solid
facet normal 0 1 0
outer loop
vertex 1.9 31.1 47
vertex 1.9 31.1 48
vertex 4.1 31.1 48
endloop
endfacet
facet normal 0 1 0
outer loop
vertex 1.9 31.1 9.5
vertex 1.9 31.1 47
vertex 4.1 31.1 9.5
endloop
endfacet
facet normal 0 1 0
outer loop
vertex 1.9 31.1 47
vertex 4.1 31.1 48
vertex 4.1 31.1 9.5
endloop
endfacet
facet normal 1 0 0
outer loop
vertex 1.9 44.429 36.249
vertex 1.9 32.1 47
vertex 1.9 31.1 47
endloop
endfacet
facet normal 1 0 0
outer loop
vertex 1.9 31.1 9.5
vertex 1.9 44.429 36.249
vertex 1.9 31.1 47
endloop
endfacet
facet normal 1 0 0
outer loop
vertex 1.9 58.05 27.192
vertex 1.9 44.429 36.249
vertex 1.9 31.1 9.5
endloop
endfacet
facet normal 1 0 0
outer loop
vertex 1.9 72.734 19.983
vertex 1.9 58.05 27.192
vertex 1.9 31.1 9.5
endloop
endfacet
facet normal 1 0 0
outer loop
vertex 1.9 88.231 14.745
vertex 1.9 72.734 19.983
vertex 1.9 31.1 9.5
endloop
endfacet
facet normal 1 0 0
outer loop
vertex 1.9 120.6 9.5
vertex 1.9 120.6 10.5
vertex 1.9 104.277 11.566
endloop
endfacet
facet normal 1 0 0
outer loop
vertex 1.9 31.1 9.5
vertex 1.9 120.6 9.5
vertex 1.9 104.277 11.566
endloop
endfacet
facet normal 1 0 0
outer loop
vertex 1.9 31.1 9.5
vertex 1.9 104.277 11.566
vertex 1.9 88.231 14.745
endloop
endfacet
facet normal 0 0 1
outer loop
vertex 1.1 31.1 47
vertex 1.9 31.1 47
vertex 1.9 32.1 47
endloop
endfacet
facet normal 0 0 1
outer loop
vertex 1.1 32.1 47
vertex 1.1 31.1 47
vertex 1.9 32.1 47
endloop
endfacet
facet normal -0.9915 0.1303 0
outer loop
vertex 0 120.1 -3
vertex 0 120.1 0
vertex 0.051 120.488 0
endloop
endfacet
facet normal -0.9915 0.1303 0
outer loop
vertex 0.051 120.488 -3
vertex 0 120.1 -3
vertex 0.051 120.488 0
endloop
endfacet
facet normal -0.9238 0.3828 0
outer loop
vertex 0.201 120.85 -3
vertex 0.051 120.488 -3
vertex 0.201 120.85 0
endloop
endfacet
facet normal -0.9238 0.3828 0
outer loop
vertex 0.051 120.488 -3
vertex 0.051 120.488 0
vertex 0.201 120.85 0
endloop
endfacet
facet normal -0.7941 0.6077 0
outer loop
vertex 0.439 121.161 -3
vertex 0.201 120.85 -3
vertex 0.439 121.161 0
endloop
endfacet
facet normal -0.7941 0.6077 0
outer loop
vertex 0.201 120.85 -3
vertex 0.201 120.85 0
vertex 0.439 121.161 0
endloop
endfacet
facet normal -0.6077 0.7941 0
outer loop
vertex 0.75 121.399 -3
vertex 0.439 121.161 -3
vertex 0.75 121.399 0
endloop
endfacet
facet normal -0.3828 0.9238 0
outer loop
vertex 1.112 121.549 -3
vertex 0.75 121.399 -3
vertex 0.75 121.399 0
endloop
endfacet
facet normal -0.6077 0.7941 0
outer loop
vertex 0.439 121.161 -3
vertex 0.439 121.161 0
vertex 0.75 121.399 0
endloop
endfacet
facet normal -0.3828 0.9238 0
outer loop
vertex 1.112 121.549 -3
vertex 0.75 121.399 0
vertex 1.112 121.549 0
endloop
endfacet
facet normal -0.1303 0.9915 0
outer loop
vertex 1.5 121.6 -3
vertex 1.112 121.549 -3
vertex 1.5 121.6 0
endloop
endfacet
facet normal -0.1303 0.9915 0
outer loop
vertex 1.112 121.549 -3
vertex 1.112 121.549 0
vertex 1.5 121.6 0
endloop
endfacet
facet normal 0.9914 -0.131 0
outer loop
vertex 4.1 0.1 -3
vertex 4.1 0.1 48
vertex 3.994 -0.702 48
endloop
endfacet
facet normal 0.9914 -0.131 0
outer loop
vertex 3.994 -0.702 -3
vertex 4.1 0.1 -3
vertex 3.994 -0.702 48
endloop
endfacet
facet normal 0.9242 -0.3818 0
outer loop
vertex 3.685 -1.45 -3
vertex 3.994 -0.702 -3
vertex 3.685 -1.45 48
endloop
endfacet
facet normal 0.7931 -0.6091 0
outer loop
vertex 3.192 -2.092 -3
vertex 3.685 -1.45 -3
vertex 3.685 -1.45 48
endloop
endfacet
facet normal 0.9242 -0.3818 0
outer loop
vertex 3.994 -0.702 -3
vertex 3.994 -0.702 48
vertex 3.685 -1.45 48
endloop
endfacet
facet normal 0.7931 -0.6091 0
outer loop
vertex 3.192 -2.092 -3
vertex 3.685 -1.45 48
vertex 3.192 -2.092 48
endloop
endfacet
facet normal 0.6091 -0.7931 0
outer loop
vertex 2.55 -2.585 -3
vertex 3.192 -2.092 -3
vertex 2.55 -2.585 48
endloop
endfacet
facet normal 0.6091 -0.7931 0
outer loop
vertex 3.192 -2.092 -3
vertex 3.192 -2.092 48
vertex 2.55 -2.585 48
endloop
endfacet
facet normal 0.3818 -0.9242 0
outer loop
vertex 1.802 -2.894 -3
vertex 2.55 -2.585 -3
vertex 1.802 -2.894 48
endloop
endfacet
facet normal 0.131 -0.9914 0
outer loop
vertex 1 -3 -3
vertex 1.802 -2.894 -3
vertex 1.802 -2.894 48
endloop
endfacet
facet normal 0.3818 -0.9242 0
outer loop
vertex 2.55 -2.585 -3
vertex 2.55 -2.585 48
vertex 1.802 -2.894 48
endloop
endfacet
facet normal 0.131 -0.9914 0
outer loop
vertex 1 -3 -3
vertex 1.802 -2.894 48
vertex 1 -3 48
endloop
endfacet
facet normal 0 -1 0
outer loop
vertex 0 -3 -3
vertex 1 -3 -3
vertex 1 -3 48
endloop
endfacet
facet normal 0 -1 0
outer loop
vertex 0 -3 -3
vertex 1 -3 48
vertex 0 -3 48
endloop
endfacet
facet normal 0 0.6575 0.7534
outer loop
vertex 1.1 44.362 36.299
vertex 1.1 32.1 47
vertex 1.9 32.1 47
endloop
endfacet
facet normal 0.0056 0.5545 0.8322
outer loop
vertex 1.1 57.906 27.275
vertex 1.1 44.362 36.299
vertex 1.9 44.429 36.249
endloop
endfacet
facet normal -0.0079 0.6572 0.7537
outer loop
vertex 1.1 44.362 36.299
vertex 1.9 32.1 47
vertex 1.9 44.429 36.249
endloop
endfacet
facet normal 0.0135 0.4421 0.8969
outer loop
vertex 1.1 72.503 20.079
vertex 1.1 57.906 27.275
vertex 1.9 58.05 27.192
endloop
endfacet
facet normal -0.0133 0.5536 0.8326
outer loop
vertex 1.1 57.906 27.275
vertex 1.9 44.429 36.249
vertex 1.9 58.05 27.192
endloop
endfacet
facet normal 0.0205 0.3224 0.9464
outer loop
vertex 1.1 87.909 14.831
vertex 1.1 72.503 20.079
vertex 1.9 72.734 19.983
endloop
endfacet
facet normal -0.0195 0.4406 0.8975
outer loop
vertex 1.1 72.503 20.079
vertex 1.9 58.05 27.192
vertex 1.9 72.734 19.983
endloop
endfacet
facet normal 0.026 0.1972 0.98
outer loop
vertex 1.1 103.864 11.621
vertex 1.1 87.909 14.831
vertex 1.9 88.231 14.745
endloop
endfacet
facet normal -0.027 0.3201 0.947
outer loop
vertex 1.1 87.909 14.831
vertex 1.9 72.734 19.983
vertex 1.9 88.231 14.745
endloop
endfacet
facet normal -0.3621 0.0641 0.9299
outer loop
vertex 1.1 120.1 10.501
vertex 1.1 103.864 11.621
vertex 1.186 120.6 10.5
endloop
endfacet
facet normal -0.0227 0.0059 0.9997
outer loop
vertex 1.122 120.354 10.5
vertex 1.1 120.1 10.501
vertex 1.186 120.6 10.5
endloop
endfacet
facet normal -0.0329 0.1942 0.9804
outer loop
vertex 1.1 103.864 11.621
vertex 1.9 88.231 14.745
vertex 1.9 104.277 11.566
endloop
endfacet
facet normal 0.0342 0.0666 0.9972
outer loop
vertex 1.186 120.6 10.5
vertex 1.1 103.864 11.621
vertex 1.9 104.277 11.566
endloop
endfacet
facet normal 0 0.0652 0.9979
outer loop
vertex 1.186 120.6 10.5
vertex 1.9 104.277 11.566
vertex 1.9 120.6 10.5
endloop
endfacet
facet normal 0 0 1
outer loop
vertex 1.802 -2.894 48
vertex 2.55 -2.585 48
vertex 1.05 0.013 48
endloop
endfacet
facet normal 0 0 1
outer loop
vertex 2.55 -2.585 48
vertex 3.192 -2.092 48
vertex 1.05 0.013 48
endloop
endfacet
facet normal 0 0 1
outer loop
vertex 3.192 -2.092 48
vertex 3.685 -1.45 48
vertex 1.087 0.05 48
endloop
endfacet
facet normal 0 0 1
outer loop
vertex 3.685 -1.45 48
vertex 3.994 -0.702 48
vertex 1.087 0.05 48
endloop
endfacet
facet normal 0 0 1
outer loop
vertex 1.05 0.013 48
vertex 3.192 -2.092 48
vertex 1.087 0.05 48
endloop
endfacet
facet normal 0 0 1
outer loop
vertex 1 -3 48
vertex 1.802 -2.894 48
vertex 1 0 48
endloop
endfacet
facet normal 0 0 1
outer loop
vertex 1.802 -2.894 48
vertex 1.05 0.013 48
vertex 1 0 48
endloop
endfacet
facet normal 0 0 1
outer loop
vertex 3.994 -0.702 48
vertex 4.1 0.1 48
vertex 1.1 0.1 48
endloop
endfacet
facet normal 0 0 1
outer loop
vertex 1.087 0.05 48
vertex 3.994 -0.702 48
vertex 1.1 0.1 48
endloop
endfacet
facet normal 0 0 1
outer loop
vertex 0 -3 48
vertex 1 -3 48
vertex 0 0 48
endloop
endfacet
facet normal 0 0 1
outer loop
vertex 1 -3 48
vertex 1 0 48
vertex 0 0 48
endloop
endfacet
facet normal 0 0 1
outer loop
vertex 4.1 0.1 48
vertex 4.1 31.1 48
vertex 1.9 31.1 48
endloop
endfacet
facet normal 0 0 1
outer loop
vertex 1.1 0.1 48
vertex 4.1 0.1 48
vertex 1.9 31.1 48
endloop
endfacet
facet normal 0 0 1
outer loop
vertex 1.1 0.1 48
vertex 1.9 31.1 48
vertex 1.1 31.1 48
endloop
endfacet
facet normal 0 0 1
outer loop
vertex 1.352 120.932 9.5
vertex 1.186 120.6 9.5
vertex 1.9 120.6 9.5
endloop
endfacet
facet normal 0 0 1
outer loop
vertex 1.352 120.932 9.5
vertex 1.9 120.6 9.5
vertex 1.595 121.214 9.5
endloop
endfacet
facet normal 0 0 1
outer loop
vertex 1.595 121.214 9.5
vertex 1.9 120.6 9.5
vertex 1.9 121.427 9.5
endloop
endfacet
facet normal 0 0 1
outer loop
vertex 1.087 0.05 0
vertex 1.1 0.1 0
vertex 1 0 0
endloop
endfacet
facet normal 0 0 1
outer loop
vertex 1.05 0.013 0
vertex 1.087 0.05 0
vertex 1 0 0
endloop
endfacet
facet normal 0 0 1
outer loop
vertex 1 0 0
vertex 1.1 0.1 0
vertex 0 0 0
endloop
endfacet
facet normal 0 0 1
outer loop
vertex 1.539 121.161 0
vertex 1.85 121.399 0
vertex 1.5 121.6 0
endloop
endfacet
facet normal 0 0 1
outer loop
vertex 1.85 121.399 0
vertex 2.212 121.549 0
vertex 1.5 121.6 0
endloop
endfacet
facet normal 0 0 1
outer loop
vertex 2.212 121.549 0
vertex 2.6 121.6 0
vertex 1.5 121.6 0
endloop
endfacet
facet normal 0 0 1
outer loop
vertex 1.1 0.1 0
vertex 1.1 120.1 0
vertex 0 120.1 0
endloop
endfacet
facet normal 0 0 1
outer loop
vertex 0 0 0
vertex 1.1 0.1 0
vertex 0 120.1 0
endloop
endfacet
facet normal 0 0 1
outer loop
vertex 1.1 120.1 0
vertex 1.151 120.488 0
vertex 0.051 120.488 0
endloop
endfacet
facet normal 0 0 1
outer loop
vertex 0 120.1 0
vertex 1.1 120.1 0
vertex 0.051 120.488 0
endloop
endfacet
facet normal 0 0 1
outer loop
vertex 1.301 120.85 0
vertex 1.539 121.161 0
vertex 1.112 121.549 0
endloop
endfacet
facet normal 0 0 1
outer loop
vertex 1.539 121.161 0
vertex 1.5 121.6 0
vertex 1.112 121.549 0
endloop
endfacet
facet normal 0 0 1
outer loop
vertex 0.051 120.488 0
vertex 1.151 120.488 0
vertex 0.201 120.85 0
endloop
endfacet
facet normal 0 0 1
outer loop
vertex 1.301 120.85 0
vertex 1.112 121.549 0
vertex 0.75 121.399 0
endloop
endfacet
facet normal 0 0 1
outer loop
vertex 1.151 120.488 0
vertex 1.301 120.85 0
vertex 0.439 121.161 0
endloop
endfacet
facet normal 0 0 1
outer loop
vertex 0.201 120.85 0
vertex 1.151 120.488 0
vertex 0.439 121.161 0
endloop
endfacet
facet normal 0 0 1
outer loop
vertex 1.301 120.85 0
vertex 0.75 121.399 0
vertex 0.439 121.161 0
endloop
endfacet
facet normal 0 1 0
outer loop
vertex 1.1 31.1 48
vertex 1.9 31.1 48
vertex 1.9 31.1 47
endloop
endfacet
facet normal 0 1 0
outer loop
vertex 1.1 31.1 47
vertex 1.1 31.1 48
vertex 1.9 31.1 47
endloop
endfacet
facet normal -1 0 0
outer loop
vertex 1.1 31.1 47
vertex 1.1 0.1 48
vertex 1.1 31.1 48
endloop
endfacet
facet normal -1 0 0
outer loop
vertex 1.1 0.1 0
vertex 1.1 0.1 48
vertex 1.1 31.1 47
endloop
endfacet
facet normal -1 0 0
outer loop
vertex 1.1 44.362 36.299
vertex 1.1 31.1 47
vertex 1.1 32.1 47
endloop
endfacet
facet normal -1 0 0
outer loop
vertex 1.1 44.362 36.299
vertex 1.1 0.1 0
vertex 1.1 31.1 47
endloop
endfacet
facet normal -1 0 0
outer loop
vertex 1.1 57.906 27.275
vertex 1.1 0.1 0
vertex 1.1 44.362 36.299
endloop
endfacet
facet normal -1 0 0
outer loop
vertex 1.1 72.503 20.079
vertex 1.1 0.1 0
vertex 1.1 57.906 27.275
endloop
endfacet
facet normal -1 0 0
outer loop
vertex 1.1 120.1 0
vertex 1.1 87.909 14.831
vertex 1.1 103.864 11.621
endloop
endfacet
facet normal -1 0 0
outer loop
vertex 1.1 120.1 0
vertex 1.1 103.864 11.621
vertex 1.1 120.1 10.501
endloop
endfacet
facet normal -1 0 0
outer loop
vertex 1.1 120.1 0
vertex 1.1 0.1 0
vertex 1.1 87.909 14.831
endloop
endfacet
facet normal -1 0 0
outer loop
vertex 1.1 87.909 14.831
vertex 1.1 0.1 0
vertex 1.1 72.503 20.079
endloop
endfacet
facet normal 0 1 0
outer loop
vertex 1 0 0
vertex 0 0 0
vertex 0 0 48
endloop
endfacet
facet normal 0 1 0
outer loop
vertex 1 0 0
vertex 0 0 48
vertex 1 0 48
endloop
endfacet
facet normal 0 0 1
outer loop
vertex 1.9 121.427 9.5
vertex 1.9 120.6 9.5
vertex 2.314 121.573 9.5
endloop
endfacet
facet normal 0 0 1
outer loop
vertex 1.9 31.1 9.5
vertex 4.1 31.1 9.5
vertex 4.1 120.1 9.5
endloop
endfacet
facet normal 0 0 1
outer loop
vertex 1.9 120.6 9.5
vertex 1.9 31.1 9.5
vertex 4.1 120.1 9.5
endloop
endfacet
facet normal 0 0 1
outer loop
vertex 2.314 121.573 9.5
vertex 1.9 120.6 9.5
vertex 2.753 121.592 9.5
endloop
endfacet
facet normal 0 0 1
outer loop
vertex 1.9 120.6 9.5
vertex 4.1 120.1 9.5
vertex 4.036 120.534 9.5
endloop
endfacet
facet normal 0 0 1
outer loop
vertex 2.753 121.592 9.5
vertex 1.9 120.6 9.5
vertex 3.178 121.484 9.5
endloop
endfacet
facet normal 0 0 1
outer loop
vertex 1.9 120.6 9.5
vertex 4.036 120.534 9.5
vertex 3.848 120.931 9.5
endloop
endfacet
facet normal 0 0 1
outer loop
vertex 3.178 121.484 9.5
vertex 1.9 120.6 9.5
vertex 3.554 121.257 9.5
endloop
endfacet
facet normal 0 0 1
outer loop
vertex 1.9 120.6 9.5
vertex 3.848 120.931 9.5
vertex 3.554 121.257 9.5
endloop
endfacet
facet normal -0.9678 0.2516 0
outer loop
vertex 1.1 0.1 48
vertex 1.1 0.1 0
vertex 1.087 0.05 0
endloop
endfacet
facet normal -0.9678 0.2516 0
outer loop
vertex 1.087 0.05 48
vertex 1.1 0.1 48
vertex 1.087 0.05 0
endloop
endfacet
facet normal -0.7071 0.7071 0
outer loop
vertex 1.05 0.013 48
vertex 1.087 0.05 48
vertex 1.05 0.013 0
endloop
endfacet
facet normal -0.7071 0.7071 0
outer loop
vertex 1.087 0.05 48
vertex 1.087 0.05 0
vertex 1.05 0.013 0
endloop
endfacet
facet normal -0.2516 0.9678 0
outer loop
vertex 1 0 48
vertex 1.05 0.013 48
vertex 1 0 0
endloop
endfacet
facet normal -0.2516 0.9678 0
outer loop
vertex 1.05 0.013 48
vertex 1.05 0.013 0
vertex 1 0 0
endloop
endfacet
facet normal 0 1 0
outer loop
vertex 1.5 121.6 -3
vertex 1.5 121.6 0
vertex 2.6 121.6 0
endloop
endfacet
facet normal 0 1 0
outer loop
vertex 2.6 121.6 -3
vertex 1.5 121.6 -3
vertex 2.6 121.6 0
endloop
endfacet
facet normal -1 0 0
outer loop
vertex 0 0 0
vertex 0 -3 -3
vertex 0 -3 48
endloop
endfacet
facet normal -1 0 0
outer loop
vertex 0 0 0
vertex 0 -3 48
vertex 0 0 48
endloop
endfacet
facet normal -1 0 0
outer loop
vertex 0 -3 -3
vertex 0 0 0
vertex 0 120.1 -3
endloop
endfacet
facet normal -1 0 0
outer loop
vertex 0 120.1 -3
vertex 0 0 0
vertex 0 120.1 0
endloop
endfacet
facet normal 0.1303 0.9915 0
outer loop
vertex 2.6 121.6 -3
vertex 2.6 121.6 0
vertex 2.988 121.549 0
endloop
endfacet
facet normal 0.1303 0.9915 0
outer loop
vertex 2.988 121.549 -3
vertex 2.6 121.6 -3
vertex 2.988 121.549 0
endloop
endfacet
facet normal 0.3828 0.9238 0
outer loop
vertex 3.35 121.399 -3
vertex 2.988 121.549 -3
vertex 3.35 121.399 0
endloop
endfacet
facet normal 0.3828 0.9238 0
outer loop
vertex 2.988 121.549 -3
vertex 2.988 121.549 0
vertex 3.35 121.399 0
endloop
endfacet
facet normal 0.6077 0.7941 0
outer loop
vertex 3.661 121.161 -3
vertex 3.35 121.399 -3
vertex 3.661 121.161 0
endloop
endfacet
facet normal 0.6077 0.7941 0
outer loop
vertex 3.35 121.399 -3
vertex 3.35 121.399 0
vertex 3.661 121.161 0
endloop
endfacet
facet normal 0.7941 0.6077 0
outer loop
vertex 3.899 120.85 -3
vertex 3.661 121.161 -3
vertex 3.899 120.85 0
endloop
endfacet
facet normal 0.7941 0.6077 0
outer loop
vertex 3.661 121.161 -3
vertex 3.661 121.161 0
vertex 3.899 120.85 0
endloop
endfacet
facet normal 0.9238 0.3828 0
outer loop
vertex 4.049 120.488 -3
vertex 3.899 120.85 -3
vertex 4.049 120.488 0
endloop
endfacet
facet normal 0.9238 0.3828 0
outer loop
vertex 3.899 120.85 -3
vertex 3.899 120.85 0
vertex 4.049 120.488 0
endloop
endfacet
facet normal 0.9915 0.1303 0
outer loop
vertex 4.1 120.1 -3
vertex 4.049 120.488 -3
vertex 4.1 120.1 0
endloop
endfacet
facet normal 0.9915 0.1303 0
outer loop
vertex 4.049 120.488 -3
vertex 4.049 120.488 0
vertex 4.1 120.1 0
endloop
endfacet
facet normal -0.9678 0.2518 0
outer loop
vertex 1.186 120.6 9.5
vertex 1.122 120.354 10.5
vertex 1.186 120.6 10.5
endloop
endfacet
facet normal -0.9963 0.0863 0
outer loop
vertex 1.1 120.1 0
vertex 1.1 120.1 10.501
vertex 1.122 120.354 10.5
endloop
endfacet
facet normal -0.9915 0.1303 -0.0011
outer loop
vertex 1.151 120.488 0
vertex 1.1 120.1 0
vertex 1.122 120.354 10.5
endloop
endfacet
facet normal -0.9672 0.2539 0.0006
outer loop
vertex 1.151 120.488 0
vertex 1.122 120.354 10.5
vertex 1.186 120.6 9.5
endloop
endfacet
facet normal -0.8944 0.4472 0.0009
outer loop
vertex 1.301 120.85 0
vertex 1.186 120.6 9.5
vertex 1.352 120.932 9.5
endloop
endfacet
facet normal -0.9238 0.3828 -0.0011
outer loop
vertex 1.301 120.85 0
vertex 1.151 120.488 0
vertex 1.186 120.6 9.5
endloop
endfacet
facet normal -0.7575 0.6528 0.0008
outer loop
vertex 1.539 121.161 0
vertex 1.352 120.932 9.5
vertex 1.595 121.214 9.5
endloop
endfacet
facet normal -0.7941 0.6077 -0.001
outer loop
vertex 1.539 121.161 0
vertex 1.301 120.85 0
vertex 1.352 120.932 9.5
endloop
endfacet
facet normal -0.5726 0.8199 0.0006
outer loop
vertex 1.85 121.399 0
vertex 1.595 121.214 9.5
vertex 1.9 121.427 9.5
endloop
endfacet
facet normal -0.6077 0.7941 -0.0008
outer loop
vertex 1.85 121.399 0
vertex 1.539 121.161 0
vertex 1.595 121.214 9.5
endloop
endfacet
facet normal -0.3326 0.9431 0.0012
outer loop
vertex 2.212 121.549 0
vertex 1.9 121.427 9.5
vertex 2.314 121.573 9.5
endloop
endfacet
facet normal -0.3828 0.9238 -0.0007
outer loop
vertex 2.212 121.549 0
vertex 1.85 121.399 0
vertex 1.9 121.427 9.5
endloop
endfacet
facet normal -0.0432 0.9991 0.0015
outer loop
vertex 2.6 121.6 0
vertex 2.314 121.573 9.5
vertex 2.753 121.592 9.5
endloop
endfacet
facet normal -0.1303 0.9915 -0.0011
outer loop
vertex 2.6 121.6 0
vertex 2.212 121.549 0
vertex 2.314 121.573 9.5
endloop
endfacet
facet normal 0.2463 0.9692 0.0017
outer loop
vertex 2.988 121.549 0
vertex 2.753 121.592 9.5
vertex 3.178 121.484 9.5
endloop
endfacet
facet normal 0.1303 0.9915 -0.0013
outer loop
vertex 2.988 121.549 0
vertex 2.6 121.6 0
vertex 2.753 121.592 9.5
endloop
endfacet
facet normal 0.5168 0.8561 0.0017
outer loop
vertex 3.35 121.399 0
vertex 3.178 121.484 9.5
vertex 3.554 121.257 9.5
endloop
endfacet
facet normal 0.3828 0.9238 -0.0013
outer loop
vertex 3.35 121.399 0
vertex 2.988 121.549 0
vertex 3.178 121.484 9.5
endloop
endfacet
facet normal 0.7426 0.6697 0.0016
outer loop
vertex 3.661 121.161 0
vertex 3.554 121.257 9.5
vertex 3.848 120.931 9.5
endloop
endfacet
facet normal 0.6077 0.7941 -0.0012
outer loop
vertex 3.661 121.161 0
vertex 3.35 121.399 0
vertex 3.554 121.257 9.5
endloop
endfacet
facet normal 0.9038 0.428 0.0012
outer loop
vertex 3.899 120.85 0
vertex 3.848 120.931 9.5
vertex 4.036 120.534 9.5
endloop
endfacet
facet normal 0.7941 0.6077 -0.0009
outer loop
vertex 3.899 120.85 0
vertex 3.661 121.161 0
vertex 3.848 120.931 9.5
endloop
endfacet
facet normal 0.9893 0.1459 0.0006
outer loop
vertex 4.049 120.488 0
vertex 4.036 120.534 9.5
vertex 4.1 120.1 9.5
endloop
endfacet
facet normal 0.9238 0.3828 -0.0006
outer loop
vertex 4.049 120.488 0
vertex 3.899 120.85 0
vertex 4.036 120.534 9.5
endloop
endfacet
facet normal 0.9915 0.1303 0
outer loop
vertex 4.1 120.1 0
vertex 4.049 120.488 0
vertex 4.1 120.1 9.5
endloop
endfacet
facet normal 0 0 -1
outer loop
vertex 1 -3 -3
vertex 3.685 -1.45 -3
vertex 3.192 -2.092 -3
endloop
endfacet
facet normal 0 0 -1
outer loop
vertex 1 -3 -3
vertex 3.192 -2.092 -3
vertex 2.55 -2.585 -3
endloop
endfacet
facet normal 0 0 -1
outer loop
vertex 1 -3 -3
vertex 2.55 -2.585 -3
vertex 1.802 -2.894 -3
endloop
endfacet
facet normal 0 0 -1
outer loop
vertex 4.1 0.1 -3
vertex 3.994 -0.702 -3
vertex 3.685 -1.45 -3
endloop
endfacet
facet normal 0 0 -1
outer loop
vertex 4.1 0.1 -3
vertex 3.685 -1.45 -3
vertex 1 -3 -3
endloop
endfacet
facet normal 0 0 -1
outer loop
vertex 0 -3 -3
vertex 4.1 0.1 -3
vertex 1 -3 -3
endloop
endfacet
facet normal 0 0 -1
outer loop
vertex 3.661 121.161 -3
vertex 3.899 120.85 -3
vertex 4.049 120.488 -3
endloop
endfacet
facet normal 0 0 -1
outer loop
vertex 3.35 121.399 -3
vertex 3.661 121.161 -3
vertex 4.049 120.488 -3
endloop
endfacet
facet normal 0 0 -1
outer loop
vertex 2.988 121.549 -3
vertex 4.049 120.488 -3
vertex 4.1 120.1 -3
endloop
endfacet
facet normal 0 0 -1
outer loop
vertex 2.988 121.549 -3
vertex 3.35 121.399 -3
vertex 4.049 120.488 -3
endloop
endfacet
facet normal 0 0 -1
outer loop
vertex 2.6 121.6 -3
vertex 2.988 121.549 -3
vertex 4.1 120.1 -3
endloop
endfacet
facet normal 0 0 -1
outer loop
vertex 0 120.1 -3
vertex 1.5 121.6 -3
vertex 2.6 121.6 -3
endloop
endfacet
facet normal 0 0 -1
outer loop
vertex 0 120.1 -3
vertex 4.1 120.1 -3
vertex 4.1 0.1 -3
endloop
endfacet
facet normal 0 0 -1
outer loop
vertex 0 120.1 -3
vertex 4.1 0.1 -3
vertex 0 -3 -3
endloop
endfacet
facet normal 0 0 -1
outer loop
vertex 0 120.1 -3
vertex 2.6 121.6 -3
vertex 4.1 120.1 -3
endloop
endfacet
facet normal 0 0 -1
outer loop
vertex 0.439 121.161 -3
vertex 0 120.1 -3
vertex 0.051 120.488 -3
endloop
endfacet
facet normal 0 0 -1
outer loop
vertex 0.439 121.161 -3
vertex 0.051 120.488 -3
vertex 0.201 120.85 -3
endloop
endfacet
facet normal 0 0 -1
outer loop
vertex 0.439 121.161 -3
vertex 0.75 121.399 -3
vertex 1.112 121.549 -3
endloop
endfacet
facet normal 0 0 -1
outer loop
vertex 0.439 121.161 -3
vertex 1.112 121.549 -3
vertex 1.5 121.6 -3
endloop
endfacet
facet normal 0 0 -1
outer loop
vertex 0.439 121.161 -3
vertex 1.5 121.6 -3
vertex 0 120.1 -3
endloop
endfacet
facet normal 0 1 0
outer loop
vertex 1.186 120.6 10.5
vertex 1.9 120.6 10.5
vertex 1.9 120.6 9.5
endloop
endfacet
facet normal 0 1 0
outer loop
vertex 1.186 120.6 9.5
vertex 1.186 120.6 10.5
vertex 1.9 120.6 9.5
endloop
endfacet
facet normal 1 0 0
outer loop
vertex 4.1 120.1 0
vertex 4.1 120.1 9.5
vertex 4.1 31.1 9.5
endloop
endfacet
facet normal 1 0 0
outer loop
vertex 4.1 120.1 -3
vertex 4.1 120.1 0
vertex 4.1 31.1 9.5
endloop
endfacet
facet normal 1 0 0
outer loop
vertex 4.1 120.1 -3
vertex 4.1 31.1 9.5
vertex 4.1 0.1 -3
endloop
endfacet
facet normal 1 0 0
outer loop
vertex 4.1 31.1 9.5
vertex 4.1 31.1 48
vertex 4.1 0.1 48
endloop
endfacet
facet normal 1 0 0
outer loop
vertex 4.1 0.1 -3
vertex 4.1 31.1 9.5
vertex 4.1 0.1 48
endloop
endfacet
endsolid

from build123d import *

# Parameters (mm, degrees)
CROQUIS1_W              = 1
CROQUIS1_H              = 3
SALIENTE_EXTRUIR1_DEPTH = 48
SALIENTE_EXTRUIR2_DEPTH = 3
CROQUIS3_W              = 38.5
CROQUIS3_H              = 90.5
CORTAR_EXTRUIR1_DEPTH   = 2.2
CORTAR_EXTRUIR2_DEPTH   = 2.9


with BuildPart() as part:
    # Croquis1 → Saliente-Extruir1 (new body)
    with BuildSketch(Plane.XY):
        with BuildLine():
            ThreePointArc((1.1, 120.1), (2.6, 121.6), (4.1, 120.1))
            Line((4.1, 120.1), (4.1, 0.1))
            Line((4.1, 0.1), (1.1, 0.1))
            Line((1.1, 0.1), (1.1, 120.1))
        make_face()
        with BuildLine():
            Line((1, 0), (1, -3))
            ThreePointArc((1, -3), (3.192031022, -2.092031022), (4.1, 0.1))
            Line((4.1, 0.1), (1.1, 0.1))
            ThreePointArc((1.1, 0.1), (1.070710678, 0.029289322), (1, 0))
        make_face()
        with Locations((0.5, -1.5)):
            Rectangle(CROQUIS1_W, CROQUIS1_H)
    extrude(amount=SALIENTE_EXTRUIR1_DEPTH)

    # Croquis2 → Saliente-Extruir2 (add)
    with BuildSketch(Plane(origin=(0, 0, 0), x_dir=(-1, 0, 0), z_dir=(0, 0, -1))):
        with BuildLine():
            Line((-1, -3), (0, -3))
            Line((0, -3), (0, 120.1))
            ThreePointArc((0, 120.1), (-0.439339828, 121.160660172), (-1.5, 121.6))
            Line((-1.5, 121.6), (-2.6, 121.6))
            ThreePointArc((-2.6, 121.6), (-3.660660172, 121.160660172), (-4.1, 120.1))
            Line((-4.1, 120.1), (-4.1, 0.1))
            ThreePointArc((-4.1, 0.1), (-3.192031022, -2.092031022), (-1, -3))
        make_face()
    extrude(amount=SALIENTE_EXTRUIR2_DEPTH)

    # Croquis3 → Cortar-Extruir1 (cut)
    with BuildSketch(Plane(origin=(4.1, 0, 0), x_dir=(0, 0, -1), z_dir=(1, 0, 0))):
        with Locations((-28.75, 76.35)):
            Rectangle(CROQUIS3_W, CROQUIS3_H)
    extrude(amount=-CORTAR_EXTRUIR1_DEPTH, mode=Mode.SUBTRACT)

    # Croquis4 → Cortar-Extruir2 (cut, through all)
    with BuildSketch(Plane(origin=(1.9, 0, 0), x_dir=(0, 0, -1), z_dir=(1, 0, 0))):
        with BuildLine():
            Line((-9.5, 120.6), (-9.5, 121.426649916))
            Line((-9.5, 121.426649916), (-48, 121.426649916))
            Line((-48, 121.426649916), (-48, 31.1))
            Line((-48, 31.1), (-47, 31.1))
            Line((-47, 31.1), (-47, 32.1))
            ThreePointArc((-47, 32.1), (-19.983171743, 72.73430247), (-10.5, 120.6))
            Line((-10.5, 120.6), (-9.5, 120.6))
        make_face()
    extrude(amount=-CORTAR_EXTRUIR2_DEPTH, mode=Mode.SUBTRACT)


solid = part.part
